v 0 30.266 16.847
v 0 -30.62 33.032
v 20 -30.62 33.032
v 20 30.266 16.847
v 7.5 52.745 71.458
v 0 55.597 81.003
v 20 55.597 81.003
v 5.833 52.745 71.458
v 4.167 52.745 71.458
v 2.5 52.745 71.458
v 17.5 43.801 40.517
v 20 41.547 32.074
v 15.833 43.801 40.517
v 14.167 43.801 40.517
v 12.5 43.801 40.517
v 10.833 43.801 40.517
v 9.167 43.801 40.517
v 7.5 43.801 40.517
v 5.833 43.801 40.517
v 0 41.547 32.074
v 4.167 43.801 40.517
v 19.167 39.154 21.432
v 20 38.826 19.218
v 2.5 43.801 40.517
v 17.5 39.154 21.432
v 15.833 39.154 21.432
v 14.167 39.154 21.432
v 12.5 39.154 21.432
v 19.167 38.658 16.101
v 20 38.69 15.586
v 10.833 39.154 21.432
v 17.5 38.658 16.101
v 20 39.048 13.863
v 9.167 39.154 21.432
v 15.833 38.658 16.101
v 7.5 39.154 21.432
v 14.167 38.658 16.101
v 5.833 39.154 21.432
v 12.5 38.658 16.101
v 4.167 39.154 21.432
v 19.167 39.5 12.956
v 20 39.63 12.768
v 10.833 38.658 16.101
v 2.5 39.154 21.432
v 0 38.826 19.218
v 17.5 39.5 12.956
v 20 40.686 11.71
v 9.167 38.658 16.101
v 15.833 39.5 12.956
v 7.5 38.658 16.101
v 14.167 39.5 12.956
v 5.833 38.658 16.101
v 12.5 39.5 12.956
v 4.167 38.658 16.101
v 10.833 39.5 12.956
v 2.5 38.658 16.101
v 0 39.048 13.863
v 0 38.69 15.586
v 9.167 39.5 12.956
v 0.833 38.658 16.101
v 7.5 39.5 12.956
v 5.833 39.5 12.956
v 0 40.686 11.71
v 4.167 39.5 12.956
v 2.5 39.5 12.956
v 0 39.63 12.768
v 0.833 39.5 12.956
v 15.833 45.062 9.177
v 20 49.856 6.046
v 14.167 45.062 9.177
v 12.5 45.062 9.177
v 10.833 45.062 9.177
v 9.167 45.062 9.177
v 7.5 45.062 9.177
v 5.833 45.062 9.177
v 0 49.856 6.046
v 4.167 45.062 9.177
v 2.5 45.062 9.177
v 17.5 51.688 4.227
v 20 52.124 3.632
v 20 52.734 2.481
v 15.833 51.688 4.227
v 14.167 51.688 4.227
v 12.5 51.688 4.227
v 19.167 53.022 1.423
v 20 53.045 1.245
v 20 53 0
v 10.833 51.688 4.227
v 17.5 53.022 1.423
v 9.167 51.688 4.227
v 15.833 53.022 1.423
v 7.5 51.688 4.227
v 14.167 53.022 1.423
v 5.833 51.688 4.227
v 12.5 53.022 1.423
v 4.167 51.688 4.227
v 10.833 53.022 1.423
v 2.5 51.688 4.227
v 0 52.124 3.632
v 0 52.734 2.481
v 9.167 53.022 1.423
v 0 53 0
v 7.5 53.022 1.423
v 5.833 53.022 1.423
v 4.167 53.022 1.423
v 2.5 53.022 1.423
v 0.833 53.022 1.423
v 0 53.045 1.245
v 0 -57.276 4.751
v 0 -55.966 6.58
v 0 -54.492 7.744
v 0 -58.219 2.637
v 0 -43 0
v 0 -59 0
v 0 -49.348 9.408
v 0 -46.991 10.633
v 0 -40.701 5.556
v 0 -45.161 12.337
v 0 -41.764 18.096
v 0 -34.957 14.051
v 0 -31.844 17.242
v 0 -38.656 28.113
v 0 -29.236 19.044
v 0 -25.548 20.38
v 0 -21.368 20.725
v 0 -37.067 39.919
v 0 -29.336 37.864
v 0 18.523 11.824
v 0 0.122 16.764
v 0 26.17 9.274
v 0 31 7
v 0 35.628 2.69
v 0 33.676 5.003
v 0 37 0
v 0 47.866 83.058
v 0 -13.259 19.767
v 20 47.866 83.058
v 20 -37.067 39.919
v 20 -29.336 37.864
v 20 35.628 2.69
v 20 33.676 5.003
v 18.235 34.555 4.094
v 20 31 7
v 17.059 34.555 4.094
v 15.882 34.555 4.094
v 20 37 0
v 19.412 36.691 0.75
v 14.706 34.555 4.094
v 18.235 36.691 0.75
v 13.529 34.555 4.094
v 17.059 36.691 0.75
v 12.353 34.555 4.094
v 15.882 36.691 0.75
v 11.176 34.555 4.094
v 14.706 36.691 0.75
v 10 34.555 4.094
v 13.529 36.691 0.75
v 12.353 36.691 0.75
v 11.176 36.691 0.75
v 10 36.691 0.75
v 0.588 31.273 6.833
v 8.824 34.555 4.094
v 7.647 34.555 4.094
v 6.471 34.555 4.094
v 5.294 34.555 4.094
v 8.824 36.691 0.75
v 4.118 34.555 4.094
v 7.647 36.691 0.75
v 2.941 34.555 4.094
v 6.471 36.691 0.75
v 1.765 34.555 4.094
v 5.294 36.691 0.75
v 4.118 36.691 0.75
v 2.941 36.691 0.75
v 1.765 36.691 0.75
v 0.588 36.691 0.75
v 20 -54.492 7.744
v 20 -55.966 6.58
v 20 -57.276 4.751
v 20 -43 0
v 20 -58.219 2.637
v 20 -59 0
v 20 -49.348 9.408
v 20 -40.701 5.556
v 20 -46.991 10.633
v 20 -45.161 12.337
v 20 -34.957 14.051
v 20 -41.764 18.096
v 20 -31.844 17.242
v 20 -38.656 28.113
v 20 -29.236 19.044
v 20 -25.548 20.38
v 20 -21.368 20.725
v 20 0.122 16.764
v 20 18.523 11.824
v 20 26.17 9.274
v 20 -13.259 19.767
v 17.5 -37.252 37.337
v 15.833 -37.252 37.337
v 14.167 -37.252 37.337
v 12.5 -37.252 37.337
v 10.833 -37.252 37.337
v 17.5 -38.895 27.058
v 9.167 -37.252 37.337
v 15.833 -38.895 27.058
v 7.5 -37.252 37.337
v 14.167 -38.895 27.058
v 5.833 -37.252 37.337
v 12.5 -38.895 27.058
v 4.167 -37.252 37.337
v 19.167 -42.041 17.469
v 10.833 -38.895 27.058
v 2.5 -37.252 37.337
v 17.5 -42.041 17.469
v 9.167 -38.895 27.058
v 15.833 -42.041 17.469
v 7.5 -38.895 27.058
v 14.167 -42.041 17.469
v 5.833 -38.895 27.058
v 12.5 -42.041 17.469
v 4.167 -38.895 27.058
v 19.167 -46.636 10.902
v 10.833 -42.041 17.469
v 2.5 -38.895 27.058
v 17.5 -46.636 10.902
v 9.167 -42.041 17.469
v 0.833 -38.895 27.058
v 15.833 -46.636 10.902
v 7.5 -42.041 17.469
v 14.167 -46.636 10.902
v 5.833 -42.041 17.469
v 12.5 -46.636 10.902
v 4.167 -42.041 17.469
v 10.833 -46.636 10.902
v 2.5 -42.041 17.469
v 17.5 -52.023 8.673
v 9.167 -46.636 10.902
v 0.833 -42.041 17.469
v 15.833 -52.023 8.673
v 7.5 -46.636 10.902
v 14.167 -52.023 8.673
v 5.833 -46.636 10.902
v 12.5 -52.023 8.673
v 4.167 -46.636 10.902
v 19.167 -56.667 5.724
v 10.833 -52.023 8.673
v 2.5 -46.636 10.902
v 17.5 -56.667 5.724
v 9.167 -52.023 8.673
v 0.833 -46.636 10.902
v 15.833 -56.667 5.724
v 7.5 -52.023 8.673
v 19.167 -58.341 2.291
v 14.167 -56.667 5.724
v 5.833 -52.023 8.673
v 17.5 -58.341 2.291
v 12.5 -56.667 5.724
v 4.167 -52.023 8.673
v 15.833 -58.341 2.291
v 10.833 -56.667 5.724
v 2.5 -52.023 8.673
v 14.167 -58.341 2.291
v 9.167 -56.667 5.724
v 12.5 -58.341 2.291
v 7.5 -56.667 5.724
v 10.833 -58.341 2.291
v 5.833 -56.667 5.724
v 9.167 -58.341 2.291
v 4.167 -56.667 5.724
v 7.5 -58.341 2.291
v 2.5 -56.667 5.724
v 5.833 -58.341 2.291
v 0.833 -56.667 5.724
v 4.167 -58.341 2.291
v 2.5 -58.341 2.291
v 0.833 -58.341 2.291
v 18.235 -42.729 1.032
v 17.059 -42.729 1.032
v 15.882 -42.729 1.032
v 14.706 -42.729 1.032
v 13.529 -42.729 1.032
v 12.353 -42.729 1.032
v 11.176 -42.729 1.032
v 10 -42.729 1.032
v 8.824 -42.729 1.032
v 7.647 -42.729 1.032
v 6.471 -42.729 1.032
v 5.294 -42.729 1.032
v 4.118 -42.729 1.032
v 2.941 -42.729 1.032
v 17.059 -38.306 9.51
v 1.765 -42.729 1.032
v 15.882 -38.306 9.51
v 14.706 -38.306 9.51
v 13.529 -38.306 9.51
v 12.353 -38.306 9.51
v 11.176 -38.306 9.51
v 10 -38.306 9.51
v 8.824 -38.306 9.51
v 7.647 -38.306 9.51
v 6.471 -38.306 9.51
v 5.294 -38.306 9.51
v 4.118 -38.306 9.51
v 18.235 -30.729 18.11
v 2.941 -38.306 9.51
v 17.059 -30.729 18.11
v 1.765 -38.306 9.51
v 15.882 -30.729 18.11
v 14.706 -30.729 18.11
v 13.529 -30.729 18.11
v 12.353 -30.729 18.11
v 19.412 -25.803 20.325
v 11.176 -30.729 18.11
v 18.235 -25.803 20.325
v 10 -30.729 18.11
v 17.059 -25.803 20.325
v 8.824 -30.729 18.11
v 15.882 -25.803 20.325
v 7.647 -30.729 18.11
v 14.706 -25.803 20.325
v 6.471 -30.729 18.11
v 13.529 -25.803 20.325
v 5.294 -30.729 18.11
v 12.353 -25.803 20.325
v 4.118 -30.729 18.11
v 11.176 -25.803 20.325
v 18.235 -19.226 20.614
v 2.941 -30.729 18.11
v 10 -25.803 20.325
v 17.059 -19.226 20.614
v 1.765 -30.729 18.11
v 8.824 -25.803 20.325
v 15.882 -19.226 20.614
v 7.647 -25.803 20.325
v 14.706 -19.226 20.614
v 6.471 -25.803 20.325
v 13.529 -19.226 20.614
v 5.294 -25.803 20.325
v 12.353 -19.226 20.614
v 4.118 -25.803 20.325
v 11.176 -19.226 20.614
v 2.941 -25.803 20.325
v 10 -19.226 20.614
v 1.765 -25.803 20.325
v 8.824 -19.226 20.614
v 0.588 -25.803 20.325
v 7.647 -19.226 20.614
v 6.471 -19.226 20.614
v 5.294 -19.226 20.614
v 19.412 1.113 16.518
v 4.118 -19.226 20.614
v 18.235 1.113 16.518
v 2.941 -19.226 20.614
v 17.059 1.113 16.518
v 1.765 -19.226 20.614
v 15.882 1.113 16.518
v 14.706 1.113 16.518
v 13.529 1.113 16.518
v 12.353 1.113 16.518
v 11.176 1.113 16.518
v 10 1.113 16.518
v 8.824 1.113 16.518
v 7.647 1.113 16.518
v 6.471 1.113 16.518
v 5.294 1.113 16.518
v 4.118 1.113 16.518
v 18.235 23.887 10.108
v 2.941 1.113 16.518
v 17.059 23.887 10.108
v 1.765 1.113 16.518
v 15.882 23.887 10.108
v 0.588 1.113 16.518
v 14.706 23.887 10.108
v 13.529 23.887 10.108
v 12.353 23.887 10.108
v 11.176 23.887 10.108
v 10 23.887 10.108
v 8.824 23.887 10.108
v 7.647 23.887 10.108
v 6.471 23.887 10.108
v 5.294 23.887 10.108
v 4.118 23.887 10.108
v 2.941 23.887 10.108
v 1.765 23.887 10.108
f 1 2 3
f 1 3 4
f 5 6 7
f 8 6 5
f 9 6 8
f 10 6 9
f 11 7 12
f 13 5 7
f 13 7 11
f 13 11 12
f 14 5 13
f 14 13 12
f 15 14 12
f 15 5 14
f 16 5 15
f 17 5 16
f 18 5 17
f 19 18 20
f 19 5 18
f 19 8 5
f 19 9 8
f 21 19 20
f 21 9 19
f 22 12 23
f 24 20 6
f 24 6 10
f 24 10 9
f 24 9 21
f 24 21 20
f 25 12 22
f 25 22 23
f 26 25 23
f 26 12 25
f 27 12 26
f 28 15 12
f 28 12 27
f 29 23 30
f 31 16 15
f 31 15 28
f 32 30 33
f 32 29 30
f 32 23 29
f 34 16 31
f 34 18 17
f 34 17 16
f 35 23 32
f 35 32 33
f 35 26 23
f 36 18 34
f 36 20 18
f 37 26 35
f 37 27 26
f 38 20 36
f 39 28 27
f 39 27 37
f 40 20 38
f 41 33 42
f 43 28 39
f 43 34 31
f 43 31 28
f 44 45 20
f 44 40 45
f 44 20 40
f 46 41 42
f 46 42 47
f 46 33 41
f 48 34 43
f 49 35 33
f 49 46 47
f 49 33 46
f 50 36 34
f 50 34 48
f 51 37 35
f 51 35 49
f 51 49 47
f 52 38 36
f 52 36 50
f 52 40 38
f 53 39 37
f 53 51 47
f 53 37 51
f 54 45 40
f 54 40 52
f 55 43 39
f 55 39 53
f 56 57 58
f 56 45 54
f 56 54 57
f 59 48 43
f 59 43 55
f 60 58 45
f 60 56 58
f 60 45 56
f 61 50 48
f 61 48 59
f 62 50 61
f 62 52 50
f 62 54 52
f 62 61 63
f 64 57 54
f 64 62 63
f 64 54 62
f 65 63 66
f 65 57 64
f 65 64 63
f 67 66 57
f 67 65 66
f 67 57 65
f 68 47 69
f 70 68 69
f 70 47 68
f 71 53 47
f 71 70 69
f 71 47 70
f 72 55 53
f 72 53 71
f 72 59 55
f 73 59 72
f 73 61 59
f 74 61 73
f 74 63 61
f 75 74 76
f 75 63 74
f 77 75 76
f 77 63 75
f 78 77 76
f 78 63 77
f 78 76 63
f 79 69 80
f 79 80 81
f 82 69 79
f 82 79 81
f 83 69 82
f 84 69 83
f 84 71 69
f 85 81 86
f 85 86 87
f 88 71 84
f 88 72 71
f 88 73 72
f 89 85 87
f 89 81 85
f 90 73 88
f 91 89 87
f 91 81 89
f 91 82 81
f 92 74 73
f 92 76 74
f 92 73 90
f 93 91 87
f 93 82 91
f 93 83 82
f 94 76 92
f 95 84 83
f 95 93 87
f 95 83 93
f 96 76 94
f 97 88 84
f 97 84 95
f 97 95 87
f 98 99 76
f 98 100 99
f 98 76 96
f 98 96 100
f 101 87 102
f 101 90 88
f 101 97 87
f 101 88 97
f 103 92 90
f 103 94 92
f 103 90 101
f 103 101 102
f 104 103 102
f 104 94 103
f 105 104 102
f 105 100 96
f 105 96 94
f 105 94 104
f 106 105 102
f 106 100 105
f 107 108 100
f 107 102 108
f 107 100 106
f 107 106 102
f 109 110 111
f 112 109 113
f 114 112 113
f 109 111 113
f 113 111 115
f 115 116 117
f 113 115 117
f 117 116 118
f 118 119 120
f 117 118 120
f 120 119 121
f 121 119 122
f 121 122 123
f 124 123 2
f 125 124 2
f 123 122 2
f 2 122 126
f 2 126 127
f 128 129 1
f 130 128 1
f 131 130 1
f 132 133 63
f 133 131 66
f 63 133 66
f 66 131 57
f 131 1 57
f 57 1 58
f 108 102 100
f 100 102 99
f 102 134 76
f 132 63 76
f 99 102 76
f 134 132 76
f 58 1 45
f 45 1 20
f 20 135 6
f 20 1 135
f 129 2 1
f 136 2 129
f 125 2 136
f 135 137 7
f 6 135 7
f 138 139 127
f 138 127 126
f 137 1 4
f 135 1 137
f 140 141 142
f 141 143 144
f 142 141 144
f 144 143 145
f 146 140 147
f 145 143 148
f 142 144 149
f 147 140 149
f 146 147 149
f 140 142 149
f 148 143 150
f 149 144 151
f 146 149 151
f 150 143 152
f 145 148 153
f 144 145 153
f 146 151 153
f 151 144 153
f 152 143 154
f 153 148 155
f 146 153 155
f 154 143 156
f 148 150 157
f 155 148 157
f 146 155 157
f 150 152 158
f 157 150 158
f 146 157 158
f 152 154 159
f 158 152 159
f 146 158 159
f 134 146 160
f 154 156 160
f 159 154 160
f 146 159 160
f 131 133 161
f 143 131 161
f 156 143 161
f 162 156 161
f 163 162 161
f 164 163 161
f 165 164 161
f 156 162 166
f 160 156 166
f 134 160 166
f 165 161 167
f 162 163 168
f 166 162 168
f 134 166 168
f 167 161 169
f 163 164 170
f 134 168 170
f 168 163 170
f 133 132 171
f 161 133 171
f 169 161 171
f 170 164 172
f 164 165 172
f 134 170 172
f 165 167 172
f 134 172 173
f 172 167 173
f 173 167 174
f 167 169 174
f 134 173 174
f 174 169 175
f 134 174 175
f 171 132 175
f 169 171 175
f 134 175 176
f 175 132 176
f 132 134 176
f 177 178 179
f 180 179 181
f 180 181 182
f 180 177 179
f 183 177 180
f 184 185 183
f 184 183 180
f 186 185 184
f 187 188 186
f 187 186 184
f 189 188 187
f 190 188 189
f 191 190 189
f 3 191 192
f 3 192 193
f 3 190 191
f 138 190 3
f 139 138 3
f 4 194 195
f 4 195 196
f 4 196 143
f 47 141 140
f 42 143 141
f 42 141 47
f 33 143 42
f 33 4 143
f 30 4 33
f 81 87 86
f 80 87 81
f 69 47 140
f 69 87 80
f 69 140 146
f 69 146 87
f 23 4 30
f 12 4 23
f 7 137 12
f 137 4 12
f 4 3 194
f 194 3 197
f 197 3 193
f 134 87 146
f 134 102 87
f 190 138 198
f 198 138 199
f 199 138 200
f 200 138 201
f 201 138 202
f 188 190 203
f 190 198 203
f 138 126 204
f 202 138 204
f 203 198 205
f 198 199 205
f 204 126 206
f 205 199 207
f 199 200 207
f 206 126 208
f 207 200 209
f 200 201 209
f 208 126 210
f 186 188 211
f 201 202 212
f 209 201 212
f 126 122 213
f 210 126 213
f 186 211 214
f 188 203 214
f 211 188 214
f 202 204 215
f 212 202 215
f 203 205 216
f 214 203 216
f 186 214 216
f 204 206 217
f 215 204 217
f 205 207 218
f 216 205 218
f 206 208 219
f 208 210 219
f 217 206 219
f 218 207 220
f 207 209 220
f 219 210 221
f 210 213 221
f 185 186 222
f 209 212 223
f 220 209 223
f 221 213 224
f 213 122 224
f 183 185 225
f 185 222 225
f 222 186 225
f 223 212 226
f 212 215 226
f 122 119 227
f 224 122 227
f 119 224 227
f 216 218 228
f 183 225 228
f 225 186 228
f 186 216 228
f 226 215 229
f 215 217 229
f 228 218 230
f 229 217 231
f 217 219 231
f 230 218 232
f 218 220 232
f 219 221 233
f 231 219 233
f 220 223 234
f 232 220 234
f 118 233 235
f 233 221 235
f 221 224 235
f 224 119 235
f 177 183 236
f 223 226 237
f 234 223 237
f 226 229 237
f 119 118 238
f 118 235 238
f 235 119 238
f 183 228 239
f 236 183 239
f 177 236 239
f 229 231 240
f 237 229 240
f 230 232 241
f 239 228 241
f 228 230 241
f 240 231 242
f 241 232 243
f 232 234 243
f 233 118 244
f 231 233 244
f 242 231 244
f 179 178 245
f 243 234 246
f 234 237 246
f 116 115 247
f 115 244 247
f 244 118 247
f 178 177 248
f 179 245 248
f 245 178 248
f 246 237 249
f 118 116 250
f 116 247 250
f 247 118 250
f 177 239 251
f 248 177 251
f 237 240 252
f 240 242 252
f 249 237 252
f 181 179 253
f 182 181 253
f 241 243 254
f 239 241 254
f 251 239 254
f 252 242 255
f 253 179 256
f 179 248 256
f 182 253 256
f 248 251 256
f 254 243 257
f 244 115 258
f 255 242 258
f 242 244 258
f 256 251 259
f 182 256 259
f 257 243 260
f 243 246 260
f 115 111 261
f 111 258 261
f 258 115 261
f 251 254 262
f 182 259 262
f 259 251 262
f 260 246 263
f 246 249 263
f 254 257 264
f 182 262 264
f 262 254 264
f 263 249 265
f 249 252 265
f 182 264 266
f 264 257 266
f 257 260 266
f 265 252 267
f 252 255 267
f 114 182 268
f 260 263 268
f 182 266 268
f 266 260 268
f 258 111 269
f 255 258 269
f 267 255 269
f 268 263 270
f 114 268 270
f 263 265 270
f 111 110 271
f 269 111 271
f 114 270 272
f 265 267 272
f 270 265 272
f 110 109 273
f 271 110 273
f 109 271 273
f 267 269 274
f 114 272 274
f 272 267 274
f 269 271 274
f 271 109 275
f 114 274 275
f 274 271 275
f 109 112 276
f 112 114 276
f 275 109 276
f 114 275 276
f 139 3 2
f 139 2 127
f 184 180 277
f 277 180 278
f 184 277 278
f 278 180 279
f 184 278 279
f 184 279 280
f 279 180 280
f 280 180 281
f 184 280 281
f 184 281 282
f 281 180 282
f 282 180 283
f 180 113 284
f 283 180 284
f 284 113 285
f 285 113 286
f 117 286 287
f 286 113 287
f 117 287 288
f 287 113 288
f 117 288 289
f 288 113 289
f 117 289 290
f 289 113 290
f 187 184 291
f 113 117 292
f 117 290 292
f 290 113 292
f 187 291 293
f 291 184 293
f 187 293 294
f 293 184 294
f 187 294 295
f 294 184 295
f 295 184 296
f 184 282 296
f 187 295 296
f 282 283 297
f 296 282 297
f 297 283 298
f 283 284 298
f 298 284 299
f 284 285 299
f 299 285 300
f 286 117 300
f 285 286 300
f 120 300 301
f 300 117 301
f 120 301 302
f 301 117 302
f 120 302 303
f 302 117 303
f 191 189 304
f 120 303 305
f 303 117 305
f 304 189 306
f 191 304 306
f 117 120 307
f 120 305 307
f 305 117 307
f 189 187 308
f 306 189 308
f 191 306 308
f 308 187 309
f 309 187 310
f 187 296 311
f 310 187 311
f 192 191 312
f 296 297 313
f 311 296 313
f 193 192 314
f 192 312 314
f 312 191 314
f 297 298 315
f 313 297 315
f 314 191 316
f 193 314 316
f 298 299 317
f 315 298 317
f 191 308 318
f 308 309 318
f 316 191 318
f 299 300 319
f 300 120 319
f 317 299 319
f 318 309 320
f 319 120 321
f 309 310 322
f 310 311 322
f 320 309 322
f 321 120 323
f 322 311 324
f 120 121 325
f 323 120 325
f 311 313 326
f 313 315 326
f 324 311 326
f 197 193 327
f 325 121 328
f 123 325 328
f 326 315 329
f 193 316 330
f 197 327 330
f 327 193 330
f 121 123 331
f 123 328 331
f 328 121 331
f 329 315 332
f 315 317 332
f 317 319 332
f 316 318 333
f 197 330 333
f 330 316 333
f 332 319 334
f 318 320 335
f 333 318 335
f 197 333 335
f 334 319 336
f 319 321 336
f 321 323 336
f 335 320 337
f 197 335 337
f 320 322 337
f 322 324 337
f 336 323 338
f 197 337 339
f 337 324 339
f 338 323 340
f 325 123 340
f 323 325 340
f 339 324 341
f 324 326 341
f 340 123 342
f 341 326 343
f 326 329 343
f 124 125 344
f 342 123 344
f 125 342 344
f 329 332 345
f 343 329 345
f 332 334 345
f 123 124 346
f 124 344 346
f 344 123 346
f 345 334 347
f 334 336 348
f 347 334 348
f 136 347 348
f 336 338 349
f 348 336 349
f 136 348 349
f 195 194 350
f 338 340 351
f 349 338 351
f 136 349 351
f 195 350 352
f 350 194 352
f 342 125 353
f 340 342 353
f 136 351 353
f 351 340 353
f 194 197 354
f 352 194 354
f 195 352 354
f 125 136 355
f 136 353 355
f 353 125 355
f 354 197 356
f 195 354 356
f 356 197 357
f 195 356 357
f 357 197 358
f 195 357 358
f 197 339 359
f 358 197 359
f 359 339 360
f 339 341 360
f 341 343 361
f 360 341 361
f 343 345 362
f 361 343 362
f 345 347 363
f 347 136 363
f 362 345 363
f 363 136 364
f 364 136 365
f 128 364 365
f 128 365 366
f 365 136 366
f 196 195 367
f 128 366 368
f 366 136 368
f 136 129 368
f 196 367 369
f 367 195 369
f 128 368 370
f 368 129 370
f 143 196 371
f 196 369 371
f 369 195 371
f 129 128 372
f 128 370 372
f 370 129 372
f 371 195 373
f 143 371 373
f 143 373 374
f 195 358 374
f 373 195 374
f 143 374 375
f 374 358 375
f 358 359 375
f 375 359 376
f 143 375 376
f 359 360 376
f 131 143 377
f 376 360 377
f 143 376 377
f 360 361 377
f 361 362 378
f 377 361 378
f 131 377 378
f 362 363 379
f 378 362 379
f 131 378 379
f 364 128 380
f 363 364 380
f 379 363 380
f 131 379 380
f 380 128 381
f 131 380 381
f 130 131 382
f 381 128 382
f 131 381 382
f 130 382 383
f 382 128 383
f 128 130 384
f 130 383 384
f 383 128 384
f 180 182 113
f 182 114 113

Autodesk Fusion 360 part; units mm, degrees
sketch "Sketch1" plane through (0, 0, 0) normal (1, 0, 0) x (0, 1, 0)
  line L0 (-30.6201, 33.0319) -> (30.2655, 16.8473)
  line L1 (30.2655, 16.8473) -> (47.8656, 83.0578)
  line L2 (-30.6201, 33.0319) -> (-29.3356, 37.8641)
  line L3 (-29.3356, 37.8641) -> (-37.0671, 39.9192)
  line L4 (47.8656, 83.0578) -> (55.5971, 81.0026)
  spline S0 degree 5 poles (55.5971, 81.0026) (54.8835, 78.6263) (53.4911, 73.9765) (51.5067, 67.3096) (49.0703, 59.0388) (46.3801, 49.7455) (44.0559, 41.5149) (42.1124, 34.3616) (40.5672, 28.291) (39.4406, 23.291) (38.7541, 19.3234) (38.5287, 16.3145) (38.7839, 14.1424) (39.5342, 12.6279) (40.7894, 11.5126) (42.5247, 10.5195) (44.6476, 9.4254) (46.957, 8.1389) (49.1915, 6.6661) (51.0882, 5.0643) (52.4369, 3.4011) (52.9986, 2.0486) (53.1167, 1.0271) (53.0613, 0.3429) (53, 0) knots 0 0 0 0 0 0 0.05 0.1 0.15 0.2 0.25 0.3 0.35 0.4 0.45 0.5 0.55 0.6 0.65 0.7 0.75 0.8 0.85 0.9 0.95 1 1 1 1 1 1
  line L5 (53, 0) -> (37, 0)
  spline S1 degree 5 poles (-37.0671, 39.9192) (-37.1009, 39.2995) (-37.1812, 38.0602) (-37.3399, 36.2015) (-37.6286, 33.7239) (-38.1197, 30.6319) (-38.7437, 27.5562) (-39.5034, 24.5197) (-40.4009, 21.561) (-41.4372, 18.7376) (-42.6107, 16.1335) (-43.9167, 13.8508) (-45.3448, 11.982) (-46.8774, 10.5848) (-48.4878, 9.6585) (-50.1369, 9.1107) (-51.7738, 8.7503) (-53.3453, 8.3488) (-54.8032, 7.6821) (-56.1143, 6.5907) (-57.2616, 4.9898) (-58.0427, 3.2711) (-58.5513, 1.7323) (-58.8561, 0.5959) (-59, 0) knots 0 0 0 0 0 0 0.05 0.1 0.15 0.2 0.25 0.3 0.35 0.4 0.45 0.5 0.55 0.6 0.65 0.7 0.75 0.8 0.85 0.9 0.95 1 1 1 1 1 1
  line L6 (-59, 0) -> (-43, 0)
  spline S2 degree 5 poles (-43, 0) (-42.9475, 0.2542) (-42.8182, 0.7837) (-42.5518, 1.6413) (-42.0514, 2.9118) (-41.1877, 4.7037) (-40.0999, 6.6742) (-38.819, 8.7694) (-37.385, 10.9146) (-35.8352, 13.0236) (-34.1951, 15.0082) (-32.466, 16.7874) (-30.6227, 18.2939) (-28.6193, 19.4745) (-26.3935, 20.2934) (-23.8712, 20.734) (-20.9723, 20.8006) (-17.6259, 20.5137) (-13.7823, 19.9076) (-9.4274, 19.0271) (-4.5959, 17.9244) (0.6139, 16.6561) (6.0283, 15.2808) (11.4308, 13.8532) (16.589, 12.4199) (21.2864, 11.0127) (25.3459, 9.6462) (28.6713, 8.3075) (31.2494, 6.9607) (33.247, 5.5187) (34.8456, 3.9034) (35.8579, 2.4492) (36.4819, 1.262) (36.8374, 0.4278) (37, 0) knots 0 0 0 0 0 0 0.033333 0.066667 0.1 0.133333 0.166667 0.2 0.233333 0.266667 0.3 0.333333 0.366667 0.4 0.433333 0.466667 0.5 0.533333 0.566667 0.6 0.633333 0.666667 0.7 0.733333 0.766667 0.8 0.833333 0.866667 0.9 0.933333 0.966667 1 1 1 1 1 1
  line L7 (26, 10) -> (36, 4)
  point P0 (39, 14)
  point P1 (42.8399, 10.3752)
  point P2 (51, 5)
  point P3 (-41, 20)
  point P4 (-48, 10)
  point P5 (-54, 8)
  point P6 (-41, 5)
  point P7 (-35, 14)
  point P8 (-27, 20)
  point P9 (-5, 18)
  point P10 (31, 7)
  dimension "d1" = 63
  dimension "d2" = 5
  dimension "d3" = 8
  dimension "d4" = 8
extrude "Extrude1" add sketch "Sketch1" along normal blind 20
